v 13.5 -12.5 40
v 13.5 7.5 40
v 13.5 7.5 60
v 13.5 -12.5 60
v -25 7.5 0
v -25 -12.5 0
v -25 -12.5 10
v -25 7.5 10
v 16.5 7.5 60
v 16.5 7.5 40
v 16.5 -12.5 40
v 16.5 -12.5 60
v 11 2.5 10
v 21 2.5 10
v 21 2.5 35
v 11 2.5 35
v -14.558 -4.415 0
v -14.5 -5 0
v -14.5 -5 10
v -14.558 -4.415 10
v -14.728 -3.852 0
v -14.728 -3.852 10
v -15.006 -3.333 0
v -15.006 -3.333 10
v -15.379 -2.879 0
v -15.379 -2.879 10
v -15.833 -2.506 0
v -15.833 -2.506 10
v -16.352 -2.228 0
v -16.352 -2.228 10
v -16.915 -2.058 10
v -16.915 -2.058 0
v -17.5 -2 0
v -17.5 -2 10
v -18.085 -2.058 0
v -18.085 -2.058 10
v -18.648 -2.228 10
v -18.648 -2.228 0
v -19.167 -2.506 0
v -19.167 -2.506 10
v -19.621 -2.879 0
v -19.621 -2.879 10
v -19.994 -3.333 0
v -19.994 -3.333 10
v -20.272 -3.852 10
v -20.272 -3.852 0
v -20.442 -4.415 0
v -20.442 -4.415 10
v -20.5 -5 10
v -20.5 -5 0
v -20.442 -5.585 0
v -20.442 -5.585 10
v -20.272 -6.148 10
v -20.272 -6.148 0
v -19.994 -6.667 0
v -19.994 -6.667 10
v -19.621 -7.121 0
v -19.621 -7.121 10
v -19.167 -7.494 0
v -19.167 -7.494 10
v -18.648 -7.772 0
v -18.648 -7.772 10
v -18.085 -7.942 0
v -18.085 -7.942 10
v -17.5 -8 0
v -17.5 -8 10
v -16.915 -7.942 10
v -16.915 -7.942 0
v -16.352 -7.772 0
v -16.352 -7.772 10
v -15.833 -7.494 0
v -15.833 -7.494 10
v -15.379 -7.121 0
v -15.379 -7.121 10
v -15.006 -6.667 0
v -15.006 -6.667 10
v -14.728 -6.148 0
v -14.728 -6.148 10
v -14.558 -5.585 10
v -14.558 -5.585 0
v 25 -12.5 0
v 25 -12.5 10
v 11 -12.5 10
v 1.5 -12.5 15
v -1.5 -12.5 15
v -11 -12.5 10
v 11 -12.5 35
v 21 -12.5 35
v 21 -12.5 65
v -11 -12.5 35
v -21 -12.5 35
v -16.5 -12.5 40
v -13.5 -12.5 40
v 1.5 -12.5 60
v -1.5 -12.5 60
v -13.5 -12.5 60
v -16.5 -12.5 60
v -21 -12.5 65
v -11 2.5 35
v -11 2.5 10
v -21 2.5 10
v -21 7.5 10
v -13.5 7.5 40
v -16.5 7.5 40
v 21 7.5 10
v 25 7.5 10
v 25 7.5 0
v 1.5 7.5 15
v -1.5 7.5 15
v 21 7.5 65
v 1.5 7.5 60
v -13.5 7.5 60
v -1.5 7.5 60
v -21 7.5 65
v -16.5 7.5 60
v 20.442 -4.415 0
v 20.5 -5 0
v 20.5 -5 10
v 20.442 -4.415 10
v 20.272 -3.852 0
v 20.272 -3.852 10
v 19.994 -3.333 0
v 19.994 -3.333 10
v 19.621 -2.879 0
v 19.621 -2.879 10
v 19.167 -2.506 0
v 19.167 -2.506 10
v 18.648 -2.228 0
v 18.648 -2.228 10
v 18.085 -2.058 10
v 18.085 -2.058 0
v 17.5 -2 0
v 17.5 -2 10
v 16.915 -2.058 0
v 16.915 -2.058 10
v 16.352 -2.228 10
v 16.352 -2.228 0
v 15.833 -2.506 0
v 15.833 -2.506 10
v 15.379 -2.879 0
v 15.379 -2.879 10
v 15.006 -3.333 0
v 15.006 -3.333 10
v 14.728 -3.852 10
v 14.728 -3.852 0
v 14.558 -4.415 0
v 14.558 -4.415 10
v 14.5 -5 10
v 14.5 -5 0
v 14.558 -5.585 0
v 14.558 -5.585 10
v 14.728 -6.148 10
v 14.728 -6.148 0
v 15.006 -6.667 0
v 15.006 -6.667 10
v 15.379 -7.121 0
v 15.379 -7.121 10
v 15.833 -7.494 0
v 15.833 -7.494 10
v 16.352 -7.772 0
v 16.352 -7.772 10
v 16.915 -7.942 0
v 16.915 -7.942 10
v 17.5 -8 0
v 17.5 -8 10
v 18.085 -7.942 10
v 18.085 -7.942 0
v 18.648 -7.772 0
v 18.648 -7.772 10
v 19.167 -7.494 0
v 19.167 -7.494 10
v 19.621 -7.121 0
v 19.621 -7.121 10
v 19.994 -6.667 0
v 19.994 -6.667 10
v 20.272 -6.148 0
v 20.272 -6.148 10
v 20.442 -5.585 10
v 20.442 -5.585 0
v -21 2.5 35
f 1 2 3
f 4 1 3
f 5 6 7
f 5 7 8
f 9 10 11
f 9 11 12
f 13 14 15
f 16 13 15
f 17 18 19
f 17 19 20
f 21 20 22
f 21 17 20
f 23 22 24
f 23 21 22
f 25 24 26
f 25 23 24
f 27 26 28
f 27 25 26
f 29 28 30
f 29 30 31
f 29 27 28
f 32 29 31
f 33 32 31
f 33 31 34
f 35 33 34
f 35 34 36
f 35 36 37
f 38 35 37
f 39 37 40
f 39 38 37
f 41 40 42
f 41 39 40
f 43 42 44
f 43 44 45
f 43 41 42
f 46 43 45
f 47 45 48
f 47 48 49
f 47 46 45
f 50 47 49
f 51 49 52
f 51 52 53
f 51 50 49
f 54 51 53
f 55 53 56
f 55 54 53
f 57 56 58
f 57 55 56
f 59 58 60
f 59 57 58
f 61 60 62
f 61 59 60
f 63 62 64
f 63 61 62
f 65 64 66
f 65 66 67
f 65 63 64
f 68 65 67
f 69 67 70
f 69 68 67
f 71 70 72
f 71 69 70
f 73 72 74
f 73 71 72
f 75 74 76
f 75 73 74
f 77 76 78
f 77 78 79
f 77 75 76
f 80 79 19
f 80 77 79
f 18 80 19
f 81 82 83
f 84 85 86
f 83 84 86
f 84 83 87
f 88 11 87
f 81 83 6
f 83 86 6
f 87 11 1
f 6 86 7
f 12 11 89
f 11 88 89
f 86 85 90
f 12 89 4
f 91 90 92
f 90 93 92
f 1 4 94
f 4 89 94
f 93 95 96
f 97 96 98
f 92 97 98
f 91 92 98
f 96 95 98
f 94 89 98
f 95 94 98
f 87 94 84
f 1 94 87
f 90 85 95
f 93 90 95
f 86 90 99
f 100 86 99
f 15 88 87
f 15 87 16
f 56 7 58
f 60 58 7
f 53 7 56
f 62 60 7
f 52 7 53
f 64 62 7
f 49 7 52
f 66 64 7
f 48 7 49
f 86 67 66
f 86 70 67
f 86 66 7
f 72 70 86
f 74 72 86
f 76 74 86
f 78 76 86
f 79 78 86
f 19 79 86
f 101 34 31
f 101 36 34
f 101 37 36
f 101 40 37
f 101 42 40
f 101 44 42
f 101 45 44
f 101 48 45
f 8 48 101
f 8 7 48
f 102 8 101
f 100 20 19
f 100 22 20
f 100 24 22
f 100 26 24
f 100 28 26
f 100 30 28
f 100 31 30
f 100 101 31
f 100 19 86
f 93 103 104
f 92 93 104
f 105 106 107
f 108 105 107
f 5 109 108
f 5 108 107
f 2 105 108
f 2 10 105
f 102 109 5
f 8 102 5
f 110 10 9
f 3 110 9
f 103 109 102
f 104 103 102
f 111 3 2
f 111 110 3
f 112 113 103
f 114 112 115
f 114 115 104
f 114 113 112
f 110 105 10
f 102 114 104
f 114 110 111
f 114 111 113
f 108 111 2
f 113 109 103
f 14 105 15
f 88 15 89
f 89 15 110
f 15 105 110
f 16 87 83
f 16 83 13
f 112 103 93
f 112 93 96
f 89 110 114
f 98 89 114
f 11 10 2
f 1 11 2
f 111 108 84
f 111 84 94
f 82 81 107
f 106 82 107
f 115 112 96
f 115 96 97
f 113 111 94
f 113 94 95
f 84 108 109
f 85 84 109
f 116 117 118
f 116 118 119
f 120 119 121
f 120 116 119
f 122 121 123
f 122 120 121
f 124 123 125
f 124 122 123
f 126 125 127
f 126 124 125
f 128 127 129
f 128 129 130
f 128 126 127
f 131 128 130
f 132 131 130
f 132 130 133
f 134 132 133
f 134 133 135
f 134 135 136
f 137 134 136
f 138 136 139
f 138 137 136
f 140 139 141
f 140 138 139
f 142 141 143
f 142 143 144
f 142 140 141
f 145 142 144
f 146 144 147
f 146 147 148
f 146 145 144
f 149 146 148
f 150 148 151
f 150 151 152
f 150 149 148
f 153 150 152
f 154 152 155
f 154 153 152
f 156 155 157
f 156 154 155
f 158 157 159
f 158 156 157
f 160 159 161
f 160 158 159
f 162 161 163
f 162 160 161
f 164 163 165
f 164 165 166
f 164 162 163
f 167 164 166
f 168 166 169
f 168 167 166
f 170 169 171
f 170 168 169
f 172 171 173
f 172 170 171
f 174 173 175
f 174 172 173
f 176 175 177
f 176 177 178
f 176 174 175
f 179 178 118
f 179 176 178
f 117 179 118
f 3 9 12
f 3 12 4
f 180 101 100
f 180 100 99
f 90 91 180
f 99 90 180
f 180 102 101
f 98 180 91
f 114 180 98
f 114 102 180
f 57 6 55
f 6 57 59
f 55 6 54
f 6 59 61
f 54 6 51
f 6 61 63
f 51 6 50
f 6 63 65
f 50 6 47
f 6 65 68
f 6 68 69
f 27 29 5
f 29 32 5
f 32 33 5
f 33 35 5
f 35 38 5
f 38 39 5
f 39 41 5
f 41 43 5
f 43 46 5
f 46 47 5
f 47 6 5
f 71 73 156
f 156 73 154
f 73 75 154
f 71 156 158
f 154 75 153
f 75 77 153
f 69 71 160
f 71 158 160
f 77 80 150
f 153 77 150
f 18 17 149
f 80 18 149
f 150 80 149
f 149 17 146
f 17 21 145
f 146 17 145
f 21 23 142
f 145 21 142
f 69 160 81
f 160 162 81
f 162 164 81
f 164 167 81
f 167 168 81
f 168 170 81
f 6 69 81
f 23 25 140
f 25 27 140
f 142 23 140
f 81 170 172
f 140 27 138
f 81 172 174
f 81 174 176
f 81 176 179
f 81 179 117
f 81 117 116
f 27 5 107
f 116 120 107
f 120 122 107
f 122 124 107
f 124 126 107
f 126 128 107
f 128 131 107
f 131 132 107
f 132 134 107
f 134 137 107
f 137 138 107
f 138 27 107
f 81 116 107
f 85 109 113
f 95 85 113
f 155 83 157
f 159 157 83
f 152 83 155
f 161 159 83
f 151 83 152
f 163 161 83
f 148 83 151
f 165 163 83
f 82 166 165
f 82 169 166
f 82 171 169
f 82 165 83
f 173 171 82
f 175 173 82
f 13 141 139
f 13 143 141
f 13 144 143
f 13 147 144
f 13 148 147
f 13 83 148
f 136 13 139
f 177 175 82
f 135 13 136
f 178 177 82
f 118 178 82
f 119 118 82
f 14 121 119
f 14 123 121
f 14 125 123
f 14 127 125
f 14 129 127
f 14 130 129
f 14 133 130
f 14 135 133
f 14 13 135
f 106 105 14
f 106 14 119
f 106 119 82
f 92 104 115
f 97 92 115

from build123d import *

# Parameters (mm, degrees)
F0_W     = 50
F0_H     = 20
F0_R     = 3
F1_DEPTH = 10
F2_W     = 42
F2_H     = 55
F3_DEPTH = 20
F4_W     = 3
F4_H     = 20
F4_H_2   = 45
F5_DEPTH = 20
F6_W     = 15
F6_H     = 25
F7_DEPTH = 10


# Not quite as in the source:
# - a pattern or mirror of a feature is missing from the dataset's text; its kind, count and spacing are read off the source's solid


with BuildPart() as f1:
    # F0 (on Top) → F1 (new body)
    with BuildSketch(Plane.XY):
        with Locations((0, -2.5)):
            Rectangle(F0_W, F0_H)
        with Locations((-17.5, -5)):
            Circle(F0_R, mode=Mode.SUBTRACT)
        with Locations((17.5, -5)):
            Circle(F0_R, mode=Mode.SUBTRACT)
    extrude(amount=F1_DEPTH)

    # F2 (on face) → F3 (join)
    with BuildSketch(Plane(origin=(0, 7.5, 0), x_dir=(-1, 0, 0), z_dir=(0, 1, 0))):
        with Locations((0, 37.5)):
            Rectangle(F2_W, F2_H)
    extrude(amount=-F3_DEPTH)

    # F4 (on face) → F5 (cut, through all)
    with BuildSketch(Plane(origin=(0, 7.5, 0), x_dir=(-1, 0, 0), z_dir=(0, 1, 0))):
        with Locations((-15, 50)):
            Rectangle(F4_W, F4_H)
        with Locations((0, 37.5)):
            Rectangle(F4_W, F4_H_2)
        with Locations((15, 50)):
            Rectangle(F4_W, F4_H)
    extrude(amount=-F5_DEPTH, mode=Mode.SUBTRACT)

    # F6 (on face) → F7 (cut)
    with BuildSketch(Plane.YZ.offset(21)):
        with Locations((-5, 22.5)):
            Rectangle(F6_W, F6_H)
    f7 = extrude(amount=-F7_DEPTH, mode=Mode.SUBTRACT)

    # F7_copies: F7 across plane
    add(f7.mirror(Plane(origin=(0, 0, 0), x_dir=(0, 0, -1), z_dir=(-1, 0, 0))), mode=Mode.SUBTRACT)


solid = f1.part
